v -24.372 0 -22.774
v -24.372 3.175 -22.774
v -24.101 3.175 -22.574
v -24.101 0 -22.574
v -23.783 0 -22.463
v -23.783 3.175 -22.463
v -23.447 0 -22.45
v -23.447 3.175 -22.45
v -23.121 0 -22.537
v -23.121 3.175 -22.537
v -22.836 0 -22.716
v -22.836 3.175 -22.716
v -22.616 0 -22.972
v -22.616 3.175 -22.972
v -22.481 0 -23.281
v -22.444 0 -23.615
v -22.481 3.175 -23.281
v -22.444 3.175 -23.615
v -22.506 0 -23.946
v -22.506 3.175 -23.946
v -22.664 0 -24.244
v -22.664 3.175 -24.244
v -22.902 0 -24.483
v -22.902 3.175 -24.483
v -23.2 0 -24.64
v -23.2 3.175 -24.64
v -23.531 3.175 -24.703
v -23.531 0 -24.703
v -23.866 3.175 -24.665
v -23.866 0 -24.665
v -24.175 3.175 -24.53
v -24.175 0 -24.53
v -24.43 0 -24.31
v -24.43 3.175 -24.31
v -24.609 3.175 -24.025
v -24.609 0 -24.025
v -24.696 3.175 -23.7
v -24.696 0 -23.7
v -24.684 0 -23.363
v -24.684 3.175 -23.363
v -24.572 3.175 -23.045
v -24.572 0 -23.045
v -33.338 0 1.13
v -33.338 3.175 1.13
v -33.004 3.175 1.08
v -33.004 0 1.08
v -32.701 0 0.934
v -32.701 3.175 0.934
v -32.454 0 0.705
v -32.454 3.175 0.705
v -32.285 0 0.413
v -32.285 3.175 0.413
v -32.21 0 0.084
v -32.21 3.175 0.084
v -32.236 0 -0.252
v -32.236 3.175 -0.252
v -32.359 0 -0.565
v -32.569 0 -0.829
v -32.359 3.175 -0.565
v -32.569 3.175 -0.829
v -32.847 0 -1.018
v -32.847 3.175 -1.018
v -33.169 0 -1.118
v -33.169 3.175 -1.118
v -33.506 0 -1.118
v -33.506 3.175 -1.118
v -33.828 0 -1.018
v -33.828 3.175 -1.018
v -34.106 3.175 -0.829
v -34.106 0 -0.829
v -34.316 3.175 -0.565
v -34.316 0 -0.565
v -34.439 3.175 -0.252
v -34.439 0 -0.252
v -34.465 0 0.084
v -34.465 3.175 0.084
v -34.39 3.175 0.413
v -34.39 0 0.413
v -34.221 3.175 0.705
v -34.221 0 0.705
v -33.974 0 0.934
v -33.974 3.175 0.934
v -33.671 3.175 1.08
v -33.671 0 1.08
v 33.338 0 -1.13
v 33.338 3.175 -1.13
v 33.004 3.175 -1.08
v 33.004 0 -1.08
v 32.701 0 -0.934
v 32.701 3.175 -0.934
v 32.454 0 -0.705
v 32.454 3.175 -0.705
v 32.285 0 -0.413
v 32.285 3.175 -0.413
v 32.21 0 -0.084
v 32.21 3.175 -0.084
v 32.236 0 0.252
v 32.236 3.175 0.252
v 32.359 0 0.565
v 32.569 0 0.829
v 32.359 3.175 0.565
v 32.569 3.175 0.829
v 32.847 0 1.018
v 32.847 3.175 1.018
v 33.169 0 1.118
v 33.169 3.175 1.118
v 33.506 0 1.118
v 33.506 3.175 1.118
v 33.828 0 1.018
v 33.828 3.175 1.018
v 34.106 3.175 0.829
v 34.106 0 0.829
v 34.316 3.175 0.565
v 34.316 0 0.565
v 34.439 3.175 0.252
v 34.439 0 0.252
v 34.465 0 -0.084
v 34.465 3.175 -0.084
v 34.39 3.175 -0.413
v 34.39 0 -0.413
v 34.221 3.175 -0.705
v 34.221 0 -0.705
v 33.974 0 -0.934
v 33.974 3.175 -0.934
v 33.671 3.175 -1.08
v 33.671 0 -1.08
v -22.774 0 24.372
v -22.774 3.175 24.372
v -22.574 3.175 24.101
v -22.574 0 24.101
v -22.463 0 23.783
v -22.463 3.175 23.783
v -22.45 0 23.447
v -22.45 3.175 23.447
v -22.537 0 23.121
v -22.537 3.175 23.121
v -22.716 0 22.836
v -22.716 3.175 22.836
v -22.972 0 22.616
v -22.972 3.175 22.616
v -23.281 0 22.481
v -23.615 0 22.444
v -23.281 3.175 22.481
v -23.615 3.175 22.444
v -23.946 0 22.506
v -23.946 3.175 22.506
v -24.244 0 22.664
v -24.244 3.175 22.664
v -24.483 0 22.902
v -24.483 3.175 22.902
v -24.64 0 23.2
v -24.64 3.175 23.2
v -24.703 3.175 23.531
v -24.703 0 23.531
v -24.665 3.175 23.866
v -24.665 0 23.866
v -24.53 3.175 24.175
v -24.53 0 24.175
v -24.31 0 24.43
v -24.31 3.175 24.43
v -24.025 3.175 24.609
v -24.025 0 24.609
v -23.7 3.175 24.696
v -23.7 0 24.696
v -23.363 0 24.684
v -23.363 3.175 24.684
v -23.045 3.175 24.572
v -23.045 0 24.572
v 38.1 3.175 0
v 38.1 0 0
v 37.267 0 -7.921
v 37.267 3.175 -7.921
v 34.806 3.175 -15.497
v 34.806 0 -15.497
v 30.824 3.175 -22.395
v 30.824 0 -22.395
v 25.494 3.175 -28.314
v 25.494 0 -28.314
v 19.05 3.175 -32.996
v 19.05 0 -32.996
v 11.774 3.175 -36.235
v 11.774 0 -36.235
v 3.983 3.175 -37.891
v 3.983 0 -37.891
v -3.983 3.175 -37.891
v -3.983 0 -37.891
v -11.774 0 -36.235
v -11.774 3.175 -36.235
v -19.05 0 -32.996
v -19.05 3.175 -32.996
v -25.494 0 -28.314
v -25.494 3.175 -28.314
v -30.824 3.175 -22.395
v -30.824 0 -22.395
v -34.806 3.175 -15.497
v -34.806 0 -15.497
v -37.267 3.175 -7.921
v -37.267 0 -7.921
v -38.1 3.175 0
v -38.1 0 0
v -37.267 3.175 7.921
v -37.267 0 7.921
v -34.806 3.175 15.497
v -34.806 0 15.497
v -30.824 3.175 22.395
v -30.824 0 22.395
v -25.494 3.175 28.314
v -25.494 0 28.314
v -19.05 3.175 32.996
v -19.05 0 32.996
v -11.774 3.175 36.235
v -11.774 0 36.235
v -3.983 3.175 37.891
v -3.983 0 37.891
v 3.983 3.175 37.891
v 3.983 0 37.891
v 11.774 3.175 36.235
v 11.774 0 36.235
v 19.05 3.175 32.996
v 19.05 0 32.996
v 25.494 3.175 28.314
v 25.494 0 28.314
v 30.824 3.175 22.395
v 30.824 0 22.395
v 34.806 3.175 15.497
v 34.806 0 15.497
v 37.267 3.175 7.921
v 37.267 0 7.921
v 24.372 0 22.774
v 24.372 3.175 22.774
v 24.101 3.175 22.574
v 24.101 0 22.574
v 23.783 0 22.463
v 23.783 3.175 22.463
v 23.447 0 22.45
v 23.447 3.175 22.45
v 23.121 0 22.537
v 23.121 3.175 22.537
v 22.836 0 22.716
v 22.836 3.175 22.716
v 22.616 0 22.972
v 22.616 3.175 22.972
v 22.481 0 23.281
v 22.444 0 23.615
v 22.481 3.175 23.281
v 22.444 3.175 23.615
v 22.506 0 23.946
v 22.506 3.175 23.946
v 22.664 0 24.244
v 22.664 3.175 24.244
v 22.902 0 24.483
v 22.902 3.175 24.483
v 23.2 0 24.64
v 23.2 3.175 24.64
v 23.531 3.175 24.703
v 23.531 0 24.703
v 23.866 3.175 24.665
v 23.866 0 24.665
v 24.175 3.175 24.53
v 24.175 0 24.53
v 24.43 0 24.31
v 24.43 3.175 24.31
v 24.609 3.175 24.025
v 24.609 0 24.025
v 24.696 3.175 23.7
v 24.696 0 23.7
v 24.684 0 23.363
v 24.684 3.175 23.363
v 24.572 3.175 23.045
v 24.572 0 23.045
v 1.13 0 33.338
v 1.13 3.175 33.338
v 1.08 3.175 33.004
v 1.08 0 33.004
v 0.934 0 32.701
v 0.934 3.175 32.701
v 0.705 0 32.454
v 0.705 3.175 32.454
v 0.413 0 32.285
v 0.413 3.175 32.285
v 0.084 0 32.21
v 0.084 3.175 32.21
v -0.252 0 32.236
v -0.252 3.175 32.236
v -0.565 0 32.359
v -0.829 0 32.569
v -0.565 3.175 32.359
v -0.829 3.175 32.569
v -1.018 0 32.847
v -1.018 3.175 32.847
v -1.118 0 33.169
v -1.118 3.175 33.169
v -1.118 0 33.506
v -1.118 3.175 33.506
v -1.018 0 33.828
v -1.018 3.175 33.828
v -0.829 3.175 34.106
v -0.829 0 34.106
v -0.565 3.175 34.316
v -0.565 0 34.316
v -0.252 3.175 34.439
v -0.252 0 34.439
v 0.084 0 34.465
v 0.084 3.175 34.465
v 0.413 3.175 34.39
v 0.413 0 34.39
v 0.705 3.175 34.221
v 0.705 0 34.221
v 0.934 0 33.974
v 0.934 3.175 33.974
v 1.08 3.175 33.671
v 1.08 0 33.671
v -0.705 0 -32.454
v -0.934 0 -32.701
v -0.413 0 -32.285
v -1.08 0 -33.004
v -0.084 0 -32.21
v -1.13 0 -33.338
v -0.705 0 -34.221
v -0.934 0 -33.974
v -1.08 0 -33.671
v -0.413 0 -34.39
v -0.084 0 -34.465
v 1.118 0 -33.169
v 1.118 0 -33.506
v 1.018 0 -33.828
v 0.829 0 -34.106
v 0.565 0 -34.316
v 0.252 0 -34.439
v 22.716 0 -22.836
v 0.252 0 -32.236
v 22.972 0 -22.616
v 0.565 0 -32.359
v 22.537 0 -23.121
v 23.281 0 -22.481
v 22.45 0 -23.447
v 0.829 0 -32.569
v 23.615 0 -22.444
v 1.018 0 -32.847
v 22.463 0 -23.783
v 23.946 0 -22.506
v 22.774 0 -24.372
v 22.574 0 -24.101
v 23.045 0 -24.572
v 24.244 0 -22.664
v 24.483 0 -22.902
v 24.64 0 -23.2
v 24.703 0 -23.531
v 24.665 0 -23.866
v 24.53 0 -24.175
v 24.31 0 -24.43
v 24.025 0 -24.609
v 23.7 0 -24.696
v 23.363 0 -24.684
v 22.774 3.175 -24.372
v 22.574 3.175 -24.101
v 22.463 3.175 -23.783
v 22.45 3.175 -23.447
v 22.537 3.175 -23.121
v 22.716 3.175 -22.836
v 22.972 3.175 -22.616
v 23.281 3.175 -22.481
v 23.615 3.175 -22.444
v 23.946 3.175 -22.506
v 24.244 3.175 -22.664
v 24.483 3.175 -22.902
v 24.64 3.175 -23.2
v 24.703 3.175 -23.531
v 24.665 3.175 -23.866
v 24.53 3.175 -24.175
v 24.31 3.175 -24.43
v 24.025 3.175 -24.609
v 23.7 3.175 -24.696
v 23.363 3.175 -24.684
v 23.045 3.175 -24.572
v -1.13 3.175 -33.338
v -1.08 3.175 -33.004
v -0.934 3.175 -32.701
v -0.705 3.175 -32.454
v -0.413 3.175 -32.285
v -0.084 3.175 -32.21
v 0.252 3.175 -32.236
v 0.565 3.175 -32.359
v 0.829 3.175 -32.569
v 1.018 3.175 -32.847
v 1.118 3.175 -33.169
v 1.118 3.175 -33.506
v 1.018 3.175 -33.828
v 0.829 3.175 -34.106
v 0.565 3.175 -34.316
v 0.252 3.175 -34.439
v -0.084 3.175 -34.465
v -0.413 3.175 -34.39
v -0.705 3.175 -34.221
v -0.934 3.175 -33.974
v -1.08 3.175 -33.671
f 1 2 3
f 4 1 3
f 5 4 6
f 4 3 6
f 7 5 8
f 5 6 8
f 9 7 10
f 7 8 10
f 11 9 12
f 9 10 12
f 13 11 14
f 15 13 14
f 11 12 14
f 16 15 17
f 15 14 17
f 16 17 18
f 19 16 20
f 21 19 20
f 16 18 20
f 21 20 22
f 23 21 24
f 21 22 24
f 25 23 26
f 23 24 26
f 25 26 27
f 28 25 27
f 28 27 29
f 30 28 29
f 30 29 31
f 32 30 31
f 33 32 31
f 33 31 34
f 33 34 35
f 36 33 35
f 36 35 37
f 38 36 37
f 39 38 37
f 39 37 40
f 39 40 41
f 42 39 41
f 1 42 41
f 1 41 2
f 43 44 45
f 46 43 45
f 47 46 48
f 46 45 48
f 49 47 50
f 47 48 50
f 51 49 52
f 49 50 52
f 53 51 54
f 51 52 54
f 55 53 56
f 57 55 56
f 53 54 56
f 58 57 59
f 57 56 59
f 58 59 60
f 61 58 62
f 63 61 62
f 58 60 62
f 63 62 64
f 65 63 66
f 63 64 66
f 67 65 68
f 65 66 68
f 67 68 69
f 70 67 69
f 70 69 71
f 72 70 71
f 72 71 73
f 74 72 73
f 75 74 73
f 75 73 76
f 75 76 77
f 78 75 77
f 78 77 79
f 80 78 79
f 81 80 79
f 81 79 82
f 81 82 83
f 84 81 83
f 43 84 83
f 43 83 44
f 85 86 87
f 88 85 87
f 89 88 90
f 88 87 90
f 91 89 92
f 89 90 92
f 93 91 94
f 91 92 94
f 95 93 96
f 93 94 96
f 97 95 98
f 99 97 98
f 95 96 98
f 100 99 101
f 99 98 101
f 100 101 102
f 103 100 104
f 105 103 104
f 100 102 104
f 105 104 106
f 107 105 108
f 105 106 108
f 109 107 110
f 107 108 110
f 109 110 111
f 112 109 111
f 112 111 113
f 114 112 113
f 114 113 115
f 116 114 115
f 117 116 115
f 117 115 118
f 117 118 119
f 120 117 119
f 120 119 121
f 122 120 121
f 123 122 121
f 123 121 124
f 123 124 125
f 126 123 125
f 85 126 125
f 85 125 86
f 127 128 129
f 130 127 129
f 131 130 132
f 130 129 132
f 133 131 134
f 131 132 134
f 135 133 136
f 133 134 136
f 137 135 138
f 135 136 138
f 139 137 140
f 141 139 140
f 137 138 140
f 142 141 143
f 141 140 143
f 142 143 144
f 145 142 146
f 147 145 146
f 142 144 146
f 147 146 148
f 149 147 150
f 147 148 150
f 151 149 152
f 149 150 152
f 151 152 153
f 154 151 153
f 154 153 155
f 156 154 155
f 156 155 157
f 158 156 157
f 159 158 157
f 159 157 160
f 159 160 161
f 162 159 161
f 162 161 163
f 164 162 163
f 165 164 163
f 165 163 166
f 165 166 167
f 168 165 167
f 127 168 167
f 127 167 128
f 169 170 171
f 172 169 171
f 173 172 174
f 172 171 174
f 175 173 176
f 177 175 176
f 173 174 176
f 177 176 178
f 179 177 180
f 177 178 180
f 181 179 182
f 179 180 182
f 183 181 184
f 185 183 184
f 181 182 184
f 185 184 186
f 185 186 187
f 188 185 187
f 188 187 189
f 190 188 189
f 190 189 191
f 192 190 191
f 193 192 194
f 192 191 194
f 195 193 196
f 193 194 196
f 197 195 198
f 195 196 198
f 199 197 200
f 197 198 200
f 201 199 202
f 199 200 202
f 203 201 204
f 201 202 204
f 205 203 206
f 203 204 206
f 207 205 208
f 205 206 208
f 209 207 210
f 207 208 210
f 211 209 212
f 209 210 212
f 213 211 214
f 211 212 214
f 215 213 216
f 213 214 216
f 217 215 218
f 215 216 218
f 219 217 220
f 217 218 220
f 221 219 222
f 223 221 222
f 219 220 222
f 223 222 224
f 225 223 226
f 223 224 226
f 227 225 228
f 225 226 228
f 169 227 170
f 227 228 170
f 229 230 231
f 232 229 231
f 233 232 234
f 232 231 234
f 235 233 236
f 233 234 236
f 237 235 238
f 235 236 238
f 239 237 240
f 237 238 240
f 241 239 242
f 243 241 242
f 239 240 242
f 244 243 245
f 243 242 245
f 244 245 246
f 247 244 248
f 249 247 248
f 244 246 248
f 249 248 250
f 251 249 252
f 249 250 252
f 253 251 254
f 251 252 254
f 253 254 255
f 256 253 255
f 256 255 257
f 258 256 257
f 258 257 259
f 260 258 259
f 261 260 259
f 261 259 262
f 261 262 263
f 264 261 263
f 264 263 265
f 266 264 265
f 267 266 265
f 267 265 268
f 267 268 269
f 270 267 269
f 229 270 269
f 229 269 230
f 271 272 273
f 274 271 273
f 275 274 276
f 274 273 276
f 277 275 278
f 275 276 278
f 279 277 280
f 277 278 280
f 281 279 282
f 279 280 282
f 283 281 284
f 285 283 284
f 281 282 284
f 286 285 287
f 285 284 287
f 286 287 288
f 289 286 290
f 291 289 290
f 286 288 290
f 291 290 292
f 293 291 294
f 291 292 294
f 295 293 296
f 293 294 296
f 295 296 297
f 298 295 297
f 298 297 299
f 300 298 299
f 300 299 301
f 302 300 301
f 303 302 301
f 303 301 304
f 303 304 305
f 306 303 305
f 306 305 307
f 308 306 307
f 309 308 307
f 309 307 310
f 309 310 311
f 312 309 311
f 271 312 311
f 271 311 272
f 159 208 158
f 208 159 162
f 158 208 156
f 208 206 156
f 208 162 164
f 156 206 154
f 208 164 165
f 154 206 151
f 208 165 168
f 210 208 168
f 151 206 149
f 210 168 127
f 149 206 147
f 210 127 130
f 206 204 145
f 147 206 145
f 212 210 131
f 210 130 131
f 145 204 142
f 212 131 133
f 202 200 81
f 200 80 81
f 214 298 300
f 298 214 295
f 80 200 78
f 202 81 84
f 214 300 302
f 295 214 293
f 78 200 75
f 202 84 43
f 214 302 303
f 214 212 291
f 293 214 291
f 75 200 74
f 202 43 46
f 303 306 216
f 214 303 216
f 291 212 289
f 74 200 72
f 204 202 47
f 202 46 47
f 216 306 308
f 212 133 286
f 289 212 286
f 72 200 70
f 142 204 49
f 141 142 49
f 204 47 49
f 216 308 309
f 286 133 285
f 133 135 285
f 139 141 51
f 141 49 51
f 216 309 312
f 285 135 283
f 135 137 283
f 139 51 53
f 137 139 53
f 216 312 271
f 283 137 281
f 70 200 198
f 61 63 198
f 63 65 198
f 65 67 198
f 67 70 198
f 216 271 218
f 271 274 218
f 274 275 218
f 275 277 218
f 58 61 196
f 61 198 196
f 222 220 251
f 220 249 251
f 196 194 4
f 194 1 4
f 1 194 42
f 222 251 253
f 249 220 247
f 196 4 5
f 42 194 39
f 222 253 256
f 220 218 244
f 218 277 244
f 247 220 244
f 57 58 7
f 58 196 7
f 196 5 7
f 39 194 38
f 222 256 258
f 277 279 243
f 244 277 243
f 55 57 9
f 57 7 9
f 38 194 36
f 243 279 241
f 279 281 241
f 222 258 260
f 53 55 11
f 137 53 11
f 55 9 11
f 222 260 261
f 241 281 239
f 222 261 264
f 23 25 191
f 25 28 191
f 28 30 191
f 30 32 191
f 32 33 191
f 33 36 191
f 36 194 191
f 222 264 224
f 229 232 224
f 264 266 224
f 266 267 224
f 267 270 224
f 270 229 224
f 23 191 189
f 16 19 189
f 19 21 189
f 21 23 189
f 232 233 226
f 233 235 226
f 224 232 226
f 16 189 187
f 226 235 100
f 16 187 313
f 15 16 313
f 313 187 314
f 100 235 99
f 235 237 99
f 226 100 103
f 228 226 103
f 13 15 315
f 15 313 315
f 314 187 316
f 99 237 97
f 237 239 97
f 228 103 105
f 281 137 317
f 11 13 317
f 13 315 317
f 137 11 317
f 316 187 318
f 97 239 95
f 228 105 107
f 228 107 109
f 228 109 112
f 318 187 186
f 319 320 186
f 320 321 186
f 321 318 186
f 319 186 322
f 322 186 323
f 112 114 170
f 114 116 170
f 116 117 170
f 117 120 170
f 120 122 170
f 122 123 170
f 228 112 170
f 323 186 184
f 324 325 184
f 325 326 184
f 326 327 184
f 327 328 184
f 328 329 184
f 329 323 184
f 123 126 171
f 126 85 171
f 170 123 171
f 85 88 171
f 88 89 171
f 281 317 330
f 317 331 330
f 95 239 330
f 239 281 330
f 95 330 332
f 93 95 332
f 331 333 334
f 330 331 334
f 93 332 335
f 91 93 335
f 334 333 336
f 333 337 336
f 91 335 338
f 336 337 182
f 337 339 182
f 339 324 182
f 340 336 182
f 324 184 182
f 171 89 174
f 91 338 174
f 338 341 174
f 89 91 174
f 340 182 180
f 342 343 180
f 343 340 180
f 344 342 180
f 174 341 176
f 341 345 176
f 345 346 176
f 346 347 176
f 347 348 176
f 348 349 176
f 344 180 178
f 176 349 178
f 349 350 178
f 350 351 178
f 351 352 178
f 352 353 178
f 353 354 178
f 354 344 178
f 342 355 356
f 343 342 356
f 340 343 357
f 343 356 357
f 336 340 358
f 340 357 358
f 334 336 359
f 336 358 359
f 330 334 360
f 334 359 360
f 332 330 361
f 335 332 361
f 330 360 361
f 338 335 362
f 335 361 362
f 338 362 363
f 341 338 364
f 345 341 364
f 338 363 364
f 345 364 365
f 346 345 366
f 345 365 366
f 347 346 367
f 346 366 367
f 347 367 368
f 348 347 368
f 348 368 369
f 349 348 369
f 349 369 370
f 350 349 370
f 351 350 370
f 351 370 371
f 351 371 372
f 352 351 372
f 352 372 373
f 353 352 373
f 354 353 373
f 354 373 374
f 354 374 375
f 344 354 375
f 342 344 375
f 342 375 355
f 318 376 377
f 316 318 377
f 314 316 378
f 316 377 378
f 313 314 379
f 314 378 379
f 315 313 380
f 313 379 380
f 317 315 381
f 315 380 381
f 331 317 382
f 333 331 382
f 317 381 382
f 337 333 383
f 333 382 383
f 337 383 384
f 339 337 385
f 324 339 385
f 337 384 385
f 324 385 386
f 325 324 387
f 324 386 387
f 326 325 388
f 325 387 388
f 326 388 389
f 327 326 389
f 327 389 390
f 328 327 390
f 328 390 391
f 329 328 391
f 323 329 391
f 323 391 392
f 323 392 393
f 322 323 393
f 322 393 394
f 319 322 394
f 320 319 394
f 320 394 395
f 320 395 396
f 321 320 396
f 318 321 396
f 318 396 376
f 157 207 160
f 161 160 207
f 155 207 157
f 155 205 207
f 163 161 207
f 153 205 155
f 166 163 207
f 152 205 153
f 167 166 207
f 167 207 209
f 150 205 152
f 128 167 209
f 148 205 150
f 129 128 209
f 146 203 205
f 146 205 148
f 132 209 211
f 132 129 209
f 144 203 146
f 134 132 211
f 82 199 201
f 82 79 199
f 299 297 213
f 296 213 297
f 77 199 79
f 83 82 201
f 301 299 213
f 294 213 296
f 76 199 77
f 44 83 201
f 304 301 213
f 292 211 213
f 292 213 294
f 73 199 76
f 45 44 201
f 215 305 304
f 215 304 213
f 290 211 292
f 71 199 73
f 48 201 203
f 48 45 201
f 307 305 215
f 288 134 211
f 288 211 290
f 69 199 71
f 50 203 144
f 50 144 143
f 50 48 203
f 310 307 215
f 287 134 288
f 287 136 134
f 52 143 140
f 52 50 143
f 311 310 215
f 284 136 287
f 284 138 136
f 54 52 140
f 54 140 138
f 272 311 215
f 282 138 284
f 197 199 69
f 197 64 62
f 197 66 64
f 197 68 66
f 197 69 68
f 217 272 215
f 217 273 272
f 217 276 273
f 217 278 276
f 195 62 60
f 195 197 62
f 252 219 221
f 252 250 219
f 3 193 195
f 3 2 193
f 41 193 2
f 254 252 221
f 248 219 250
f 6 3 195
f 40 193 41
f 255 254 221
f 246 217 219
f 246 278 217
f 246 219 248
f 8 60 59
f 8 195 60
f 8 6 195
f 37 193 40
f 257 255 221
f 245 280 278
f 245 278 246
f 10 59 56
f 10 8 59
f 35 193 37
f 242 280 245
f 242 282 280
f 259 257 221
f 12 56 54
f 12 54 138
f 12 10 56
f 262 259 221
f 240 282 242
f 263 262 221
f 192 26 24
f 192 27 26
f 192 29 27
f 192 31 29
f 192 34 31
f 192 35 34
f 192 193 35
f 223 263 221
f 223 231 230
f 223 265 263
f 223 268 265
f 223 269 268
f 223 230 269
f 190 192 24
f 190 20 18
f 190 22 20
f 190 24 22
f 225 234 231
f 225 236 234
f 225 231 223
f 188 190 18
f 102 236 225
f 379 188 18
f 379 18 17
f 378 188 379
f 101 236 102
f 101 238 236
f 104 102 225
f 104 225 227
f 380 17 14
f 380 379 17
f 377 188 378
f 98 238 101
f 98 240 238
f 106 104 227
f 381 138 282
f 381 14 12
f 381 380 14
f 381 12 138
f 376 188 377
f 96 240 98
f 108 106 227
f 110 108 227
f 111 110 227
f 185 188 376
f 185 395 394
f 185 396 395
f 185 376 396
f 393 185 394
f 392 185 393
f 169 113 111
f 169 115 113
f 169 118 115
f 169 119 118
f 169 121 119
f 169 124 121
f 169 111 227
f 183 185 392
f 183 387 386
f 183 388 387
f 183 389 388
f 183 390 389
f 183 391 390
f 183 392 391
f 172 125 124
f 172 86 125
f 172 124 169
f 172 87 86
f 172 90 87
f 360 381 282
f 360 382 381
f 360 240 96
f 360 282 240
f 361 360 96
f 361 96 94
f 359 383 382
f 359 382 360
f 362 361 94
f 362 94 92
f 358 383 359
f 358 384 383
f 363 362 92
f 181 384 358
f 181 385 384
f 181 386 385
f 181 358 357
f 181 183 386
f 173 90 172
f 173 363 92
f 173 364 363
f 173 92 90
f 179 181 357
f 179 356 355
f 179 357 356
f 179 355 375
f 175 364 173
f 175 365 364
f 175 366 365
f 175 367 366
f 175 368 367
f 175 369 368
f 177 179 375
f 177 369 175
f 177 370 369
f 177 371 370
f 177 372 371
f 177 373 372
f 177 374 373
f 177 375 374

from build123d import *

# Parameters (mm, degrees)
SKETCH1_R                 = 38.1
BOSS_EXTRUDE1_DEPTH       = 3.175
TAP_DRILL_FOR_4_40_TAP1_D = 2.2606
CIRPATTERN1_COUNT         = 8


with BuildPart() as part:
    # Sketch1 → Boss-Extrude1 (new body)
    with BuildSketch(Plane(origin=(0, 0, 0), x_dir=(1, 0, 0), z_dir=(0, 1, 0))):
        Circle(SKETCH1_R)
    extrude(amount=BOSS_EXTRUDE1_DEPTH)

    # Tap Drill for #4-40 Tap1 (through all)
    with Locations(Plane(origin=(0, 0, 0), x_dir=(-1, 0, 0), z_dir=(0, -1, 0))):
        with Locations((0, -33.3375)):
            tap_drill_for_4_40_tap1 = Hole(TAP_DRILL_FOR_4_40_TAP1_D / 2)

    # CirPattern1: Tap Drill for #4-40 Tap1 ×8 about axis
    cirpattern1_axis = Axis((0, 0, 0), (0, 1, 0))
    for i in range(1, CIRPATTERN1_COUNT):
        add(tap_drill_for_4_40_tap1.rotate(cirpattern1_axis, i * 360 / CIRPATTERN1_COUNT), mode=Mode.SUBTRACT)


solid = part.part
